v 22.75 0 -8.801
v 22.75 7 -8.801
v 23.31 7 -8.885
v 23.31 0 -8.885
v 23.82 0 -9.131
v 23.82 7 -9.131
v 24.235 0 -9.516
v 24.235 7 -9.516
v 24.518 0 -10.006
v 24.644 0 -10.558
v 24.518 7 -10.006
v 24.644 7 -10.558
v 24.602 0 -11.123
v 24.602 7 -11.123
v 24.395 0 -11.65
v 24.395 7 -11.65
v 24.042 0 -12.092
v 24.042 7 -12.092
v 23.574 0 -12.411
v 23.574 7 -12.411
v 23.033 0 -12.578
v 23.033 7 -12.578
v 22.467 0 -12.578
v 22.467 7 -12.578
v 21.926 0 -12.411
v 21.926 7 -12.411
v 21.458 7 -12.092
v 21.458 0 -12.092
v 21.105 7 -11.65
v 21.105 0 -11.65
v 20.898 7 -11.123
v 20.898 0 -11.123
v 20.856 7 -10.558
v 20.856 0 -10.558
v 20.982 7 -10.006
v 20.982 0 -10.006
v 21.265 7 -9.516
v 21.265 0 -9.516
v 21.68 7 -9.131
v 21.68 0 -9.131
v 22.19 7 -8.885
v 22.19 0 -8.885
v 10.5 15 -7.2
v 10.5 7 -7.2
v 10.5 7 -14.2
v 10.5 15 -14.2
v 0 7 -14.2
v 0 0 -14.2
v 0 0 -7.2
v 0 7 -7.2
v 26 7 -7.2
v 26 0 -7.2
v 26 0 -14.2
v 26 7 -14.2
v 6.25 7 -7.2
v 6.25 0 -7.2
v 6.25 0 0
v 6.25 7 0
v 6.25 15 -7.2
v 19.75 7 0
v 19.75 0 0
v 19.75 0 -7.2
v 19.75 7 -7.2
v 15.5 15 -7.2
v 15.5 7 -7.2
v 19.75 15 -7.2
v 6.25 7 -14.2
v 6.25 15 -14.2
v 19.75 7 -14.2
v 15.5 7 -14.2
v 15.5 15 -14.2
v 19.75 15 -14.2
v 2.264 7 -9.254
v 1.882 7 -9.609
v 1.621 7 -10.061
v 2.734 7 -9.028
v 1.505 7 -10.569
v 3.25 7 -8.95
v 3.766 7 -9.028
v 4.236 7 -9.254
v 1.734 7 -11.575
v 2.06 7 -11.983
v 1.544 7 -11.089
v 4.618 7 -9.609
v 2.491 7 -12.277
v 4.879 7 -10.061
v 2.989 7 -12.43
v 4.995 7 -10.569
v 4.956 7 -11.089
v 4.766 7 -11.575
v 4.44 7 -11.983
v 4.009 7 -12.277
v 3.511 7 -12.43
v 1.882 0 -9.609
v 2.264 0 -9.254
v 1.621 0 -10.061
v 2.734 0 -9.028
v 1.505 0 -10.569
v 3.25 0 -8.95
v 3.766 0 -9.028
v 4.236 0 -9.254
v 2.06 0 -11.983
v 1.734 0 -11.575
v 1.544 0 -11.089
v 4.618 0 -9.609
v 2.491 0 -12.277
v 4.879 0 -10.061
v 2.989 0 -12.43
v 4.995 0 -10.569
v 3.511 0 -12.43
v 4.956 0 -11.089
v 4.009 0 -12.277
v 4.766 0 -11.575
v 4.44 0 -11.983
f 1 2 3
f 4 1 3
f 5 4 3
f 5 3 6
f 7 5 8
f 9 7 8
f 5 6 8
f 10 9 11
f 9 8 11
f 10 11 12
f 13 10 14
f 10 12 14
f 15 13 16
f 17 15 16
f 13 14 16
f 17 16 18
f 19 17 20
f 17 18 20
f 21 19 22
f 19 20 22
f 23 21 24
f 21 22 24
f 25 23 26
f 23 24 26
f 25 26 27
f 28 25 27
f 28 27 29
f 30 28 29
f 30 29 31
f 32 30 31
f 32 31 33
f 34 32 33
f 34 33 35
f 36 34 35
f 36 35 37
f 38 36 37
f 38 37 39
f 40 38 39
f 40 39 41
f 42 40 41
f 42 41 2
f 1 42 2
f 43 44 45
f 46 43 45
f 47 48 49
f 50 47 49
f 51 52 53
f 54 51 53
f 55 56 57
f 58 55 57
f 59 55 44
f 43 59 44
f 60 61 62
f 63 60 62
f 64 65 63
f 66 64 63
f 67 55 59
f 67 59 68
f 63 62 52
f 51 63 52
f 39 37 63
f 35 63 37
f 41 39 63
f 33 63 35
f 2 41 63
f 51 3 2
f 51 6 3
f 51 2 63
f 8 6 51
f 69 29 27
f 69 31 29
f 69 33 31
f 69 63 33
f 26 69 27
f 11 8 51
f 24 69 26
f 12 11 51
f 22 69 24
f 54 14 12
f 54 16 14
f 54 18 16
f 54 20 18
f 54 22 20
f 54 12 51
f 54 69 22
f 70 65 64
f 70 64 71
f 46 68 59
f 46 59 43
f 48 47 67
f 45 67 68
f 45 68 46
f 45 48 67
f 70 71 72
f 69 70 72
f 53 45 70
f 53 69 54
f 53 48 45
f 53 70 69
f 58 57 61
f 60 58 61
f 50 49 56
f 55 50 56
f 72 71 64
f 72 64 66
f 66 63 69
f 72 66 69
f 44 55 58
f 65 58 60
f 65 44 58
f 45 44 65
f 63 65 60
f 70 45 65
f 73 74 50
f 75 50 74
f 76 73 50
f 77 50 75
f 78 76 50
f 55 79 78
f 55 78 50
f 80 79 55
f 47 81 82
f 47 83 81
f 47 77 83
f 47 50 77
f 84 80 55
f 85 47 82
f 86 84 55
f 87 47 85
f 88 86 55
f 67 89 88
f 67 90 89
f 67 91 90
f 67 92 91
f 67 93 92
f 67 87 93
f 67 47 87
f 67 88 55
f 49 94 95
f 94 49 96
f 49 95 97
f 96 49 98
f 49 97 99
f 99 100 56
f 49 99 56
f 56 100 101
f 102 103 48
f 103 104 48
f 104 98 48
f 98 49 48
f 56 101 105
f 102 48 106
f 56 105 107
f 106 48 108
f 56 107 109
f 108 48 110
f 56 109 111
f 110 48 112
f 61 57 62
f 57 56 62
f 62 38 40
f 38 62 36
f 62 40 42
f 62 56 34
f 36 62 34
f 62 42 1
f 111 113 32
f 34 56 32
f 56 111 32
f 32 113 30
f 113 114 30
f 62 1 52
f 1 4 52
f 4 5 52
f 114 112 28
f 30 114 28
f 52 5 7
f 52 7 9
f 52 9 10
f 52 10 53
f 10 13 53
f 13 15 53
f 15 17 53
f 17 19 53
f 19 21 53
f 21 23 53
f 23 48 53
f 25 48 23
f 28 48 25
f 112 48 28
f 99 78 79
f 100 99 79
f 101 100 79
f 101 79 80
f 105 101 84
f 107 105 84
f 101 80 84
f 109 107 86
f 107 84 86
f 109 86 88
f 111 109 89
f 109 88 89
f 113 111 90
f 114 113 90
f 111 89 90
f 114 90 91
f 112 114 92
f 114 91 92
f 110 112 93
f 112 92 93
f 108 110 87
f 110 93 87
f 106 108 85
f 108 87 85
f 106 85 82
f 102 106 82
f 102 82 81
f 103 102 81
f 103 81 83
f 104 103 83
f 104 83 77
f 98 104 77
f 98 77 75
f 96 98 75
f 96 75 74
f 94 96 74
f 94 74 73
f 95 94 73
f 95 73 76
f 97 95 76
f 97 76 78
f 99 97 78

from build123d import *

# Parameters (mm, degrees)
BOSS_EXTRUDE1_DEPTH = 7
SKETCH2_W           = 4.25
SKETCH2_H           = 7
BOSS_EXTRUDE2_DEPTH = 8
SKETCH3_R           = 1.899478465
SKETCH3_R_2         = 1.75
CUT_EXTRUDE1_DEPTH  = 19


with BuildPart() as part:
    # Sketch1 → Boss-Extrude1 (new body)
    with BuildSketch(Plane(origin=(0, 0, 0), x_dir=(1, 0, 0), z_dir=(0, 1, 0))):
        Polygon((6.25, 0), (19.75, 0), (19.75, 7.2), (26, 7.2), (26, 14.2), (0, 14.2), (0, 7.2), (6.25, 7.2), align=None)
    extrude(amount=BOSS_EXTRUDE1_DEPTH)

    # Sketch2 → Boss-Extrude2 (add)
    with BuildSketch(Plane(origin=(0, 7, 0), x_dir=(1, 0, 0), z_dir=(0, 1, 0))):
        with Locations((8.375, 10.7)):
            Rectangle(SKETCH2_W, SKETCH2_H)
        with Locations((17.625, 10.7)):
            Rectangle(SKETCH2_W, SKETCH2_H)
    extrude(amount=BOSS_EXTRUDE2_DEPTH)

    # Sketch3 → Cut-Extrude1 (cut)
    with BuildSketch(Plane(origin=(0, 7, 0), x_dir=(1, 0, 0), z_dir=(0, 1, 0))):
        with Locations(Location((22.75, 10.7, 0), (0, 0, 270))):
            Circle(SKETCH3_R)
        with Locations(Location((3.25, 10.7, 0), (0, 0, 270))):
            Circle(SKETCH3_R_2)
    extrude(amount=-CUT_EXTRUDE1_DEPTH, mode=Mode.SUBTRACT)


solid = part.part
